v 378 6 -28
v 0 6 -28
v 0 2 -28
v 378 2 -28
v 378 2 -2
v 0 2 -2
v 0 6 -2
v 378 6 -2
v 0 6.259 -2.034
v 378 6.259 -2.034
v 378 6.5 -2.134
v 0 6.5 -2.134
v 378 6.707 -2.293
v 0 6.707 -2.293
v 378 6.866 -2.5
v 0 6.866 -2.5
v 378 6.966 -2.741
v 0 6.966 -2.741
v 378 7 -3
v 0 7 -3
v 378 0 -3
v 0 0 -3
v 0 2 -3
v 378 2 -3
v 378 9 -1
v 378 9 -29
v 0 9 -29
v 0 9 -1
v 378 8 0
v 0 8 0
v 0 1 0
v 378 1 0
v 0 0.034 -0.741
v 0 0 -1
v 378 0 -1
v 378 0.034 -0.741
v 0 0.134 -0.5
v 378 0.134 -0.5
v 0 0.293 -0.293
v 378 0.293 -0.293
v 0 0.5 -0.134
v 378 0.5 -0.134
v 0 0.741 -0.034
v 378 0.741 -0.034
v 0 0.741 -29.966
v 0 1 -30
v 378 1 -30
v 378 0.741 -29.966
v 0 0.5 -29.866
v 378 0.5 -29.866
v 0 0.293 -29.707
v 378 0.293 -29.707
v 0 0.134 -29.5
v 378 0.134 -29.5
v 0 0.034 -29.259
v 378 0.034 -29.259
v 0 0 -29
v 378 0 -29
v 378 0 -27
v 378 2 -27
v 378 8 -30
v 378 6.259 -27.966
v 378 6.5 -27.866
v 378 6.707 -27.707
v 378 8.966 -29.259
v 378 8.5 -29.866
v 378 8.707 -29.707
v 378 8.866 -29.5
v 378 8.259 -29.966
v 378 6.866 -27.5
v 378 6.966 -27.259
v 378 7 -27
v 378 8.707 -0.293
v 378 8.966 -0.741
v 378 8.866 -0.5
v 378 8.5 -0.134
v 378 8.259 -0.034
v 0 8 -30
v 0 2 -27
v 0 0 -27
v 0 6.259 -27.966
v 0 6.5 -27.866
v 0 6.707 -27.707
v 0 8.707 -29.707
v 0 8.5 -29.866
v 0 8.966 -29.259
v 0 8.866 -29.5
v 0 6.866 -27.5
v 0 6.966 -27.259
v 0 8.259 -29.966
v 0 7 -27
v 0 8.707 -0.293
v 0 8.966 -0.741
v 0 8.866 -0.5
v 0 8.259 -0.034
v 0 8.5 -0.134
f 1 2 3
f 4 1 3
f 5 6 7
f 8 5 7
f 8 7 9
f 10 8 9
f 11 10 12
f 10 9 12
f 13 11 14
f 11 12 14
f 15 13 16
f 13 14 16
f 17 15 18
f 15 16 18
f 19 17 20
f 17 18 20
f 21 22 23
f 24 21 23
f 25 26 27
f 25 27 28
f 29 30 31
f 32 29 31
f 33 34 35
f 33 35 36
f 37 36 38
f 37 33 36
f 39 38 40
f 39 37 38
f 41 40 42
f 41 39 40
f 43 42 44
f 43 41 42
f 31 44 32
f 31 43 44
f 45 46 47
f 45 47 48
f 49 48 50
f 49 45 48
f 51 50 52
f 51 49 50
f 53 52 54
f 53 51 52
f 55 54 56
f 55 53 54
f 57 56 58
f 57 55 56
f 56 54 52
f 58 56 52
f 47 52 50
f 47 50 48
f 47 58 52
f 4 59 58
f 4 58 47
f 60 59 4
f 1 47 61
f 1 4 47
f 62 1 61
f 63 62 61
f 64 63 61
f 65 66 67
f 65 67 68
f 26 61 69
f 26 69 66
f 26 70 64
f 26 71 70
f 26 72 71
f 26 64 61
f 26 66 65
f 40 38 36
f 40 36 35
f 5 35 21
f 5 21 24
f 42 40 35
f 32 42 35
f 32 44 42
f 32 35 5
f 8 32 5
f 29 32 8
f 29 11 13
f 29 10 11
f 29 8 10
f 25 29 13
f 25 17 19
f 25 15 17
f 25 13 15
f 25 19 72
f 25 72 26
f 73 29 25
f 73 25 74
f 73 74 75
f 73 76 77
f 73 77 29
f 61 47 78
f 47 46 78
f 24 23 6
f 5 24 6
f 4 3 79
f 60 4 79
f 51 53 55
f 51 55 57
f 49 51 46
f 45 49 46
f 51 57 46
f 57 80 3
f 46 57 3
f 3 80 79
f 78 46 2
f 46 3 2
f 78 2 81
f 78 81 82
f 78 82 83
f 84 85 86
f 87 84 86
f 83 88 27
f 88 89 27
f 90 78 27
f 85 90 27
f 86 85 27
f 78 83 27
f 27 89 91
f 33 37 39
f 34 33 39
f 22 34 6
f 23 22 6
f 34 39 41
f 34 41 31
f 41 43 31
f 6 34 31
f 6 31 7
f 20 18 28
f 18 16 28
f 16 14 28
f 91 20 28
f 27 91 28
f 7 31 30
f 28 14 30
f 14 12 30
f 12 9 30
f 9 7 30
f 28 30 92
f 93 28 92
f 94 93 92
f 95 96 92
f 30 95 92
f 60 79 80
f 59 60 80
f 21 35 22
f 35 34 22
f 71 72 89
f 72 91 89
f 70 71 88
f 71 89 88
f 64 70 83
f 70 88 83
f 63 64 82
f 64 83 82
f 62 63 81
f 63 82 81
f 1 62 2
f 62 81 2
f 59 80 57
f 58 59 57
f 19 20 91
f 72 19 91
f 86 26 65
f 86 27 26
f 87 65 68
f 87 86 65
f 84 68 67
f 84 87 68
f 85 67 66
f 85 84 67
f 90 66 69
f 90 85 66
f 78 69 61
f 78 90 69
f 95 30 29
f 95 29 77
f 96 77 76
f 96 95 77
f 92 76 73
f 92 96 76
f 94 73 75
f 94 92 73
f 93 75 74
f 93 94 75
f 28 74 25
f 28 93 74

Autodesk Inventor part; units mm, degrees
ref_plane "YZ Plane" through (0, 0, 0) normal (1, 0, 0) x (0, 1, 0)
ref_plane "XZ Plane" through (0, 0, 0) normal (0, 1, 0) x (-1, 0, 0)
ref_plane "XY Plane" through (0, 0, 0) normal (0, 0, 1) x (1, 0, 0)
sketch "Boceto principal" plane through (0, 0, 0) normal (1, 0, 0) x (0, 1, 0)
  line L0 (0, -1) -> (0, -3)
  line L1 (0, -3) -> (2, -3)
  line L2 (2, -3) -> (2, -2)
  line L3 (2, -2) -> (6, -2)
  line L4 (7, -3) -> (7, -27)
  line L5 (6, -28) -> (2, -28)
  line L6 (2, -28) -> (2, -27)
  line L7 (2, -27) -> (0, -27)
  line L8 (0, -27) -> (0, -29)
  line L9 (1, -30) -> (8, -30)
  line L10 (9, -29) -> (9, -1)
  line L11 (8, 0) -> (1, 0)
  arc A0 (1, 0) -> (0, -1) centre (1, -1) ccw
  arc A1 (7, -3) -> (6, -2) centre (6, -3) ccw
  arc A2 (6, -28) -> (7, -27) centre (6, -27) ccw
  arc A3 (0, -29) -> (1, -30) centre (1, -29) ccw
  arc A4 (8, -30) -> (9, -29) centre (8, -29) ccw
  arc A5 (9, -1) -> (8, 0) centre (8, -1) ccw
extrude "Extrusion1" add sketch "Boceto principal" along normal blind 378
properties part number "Tapa 30x30 378mm" material "PVC, Flexible"
